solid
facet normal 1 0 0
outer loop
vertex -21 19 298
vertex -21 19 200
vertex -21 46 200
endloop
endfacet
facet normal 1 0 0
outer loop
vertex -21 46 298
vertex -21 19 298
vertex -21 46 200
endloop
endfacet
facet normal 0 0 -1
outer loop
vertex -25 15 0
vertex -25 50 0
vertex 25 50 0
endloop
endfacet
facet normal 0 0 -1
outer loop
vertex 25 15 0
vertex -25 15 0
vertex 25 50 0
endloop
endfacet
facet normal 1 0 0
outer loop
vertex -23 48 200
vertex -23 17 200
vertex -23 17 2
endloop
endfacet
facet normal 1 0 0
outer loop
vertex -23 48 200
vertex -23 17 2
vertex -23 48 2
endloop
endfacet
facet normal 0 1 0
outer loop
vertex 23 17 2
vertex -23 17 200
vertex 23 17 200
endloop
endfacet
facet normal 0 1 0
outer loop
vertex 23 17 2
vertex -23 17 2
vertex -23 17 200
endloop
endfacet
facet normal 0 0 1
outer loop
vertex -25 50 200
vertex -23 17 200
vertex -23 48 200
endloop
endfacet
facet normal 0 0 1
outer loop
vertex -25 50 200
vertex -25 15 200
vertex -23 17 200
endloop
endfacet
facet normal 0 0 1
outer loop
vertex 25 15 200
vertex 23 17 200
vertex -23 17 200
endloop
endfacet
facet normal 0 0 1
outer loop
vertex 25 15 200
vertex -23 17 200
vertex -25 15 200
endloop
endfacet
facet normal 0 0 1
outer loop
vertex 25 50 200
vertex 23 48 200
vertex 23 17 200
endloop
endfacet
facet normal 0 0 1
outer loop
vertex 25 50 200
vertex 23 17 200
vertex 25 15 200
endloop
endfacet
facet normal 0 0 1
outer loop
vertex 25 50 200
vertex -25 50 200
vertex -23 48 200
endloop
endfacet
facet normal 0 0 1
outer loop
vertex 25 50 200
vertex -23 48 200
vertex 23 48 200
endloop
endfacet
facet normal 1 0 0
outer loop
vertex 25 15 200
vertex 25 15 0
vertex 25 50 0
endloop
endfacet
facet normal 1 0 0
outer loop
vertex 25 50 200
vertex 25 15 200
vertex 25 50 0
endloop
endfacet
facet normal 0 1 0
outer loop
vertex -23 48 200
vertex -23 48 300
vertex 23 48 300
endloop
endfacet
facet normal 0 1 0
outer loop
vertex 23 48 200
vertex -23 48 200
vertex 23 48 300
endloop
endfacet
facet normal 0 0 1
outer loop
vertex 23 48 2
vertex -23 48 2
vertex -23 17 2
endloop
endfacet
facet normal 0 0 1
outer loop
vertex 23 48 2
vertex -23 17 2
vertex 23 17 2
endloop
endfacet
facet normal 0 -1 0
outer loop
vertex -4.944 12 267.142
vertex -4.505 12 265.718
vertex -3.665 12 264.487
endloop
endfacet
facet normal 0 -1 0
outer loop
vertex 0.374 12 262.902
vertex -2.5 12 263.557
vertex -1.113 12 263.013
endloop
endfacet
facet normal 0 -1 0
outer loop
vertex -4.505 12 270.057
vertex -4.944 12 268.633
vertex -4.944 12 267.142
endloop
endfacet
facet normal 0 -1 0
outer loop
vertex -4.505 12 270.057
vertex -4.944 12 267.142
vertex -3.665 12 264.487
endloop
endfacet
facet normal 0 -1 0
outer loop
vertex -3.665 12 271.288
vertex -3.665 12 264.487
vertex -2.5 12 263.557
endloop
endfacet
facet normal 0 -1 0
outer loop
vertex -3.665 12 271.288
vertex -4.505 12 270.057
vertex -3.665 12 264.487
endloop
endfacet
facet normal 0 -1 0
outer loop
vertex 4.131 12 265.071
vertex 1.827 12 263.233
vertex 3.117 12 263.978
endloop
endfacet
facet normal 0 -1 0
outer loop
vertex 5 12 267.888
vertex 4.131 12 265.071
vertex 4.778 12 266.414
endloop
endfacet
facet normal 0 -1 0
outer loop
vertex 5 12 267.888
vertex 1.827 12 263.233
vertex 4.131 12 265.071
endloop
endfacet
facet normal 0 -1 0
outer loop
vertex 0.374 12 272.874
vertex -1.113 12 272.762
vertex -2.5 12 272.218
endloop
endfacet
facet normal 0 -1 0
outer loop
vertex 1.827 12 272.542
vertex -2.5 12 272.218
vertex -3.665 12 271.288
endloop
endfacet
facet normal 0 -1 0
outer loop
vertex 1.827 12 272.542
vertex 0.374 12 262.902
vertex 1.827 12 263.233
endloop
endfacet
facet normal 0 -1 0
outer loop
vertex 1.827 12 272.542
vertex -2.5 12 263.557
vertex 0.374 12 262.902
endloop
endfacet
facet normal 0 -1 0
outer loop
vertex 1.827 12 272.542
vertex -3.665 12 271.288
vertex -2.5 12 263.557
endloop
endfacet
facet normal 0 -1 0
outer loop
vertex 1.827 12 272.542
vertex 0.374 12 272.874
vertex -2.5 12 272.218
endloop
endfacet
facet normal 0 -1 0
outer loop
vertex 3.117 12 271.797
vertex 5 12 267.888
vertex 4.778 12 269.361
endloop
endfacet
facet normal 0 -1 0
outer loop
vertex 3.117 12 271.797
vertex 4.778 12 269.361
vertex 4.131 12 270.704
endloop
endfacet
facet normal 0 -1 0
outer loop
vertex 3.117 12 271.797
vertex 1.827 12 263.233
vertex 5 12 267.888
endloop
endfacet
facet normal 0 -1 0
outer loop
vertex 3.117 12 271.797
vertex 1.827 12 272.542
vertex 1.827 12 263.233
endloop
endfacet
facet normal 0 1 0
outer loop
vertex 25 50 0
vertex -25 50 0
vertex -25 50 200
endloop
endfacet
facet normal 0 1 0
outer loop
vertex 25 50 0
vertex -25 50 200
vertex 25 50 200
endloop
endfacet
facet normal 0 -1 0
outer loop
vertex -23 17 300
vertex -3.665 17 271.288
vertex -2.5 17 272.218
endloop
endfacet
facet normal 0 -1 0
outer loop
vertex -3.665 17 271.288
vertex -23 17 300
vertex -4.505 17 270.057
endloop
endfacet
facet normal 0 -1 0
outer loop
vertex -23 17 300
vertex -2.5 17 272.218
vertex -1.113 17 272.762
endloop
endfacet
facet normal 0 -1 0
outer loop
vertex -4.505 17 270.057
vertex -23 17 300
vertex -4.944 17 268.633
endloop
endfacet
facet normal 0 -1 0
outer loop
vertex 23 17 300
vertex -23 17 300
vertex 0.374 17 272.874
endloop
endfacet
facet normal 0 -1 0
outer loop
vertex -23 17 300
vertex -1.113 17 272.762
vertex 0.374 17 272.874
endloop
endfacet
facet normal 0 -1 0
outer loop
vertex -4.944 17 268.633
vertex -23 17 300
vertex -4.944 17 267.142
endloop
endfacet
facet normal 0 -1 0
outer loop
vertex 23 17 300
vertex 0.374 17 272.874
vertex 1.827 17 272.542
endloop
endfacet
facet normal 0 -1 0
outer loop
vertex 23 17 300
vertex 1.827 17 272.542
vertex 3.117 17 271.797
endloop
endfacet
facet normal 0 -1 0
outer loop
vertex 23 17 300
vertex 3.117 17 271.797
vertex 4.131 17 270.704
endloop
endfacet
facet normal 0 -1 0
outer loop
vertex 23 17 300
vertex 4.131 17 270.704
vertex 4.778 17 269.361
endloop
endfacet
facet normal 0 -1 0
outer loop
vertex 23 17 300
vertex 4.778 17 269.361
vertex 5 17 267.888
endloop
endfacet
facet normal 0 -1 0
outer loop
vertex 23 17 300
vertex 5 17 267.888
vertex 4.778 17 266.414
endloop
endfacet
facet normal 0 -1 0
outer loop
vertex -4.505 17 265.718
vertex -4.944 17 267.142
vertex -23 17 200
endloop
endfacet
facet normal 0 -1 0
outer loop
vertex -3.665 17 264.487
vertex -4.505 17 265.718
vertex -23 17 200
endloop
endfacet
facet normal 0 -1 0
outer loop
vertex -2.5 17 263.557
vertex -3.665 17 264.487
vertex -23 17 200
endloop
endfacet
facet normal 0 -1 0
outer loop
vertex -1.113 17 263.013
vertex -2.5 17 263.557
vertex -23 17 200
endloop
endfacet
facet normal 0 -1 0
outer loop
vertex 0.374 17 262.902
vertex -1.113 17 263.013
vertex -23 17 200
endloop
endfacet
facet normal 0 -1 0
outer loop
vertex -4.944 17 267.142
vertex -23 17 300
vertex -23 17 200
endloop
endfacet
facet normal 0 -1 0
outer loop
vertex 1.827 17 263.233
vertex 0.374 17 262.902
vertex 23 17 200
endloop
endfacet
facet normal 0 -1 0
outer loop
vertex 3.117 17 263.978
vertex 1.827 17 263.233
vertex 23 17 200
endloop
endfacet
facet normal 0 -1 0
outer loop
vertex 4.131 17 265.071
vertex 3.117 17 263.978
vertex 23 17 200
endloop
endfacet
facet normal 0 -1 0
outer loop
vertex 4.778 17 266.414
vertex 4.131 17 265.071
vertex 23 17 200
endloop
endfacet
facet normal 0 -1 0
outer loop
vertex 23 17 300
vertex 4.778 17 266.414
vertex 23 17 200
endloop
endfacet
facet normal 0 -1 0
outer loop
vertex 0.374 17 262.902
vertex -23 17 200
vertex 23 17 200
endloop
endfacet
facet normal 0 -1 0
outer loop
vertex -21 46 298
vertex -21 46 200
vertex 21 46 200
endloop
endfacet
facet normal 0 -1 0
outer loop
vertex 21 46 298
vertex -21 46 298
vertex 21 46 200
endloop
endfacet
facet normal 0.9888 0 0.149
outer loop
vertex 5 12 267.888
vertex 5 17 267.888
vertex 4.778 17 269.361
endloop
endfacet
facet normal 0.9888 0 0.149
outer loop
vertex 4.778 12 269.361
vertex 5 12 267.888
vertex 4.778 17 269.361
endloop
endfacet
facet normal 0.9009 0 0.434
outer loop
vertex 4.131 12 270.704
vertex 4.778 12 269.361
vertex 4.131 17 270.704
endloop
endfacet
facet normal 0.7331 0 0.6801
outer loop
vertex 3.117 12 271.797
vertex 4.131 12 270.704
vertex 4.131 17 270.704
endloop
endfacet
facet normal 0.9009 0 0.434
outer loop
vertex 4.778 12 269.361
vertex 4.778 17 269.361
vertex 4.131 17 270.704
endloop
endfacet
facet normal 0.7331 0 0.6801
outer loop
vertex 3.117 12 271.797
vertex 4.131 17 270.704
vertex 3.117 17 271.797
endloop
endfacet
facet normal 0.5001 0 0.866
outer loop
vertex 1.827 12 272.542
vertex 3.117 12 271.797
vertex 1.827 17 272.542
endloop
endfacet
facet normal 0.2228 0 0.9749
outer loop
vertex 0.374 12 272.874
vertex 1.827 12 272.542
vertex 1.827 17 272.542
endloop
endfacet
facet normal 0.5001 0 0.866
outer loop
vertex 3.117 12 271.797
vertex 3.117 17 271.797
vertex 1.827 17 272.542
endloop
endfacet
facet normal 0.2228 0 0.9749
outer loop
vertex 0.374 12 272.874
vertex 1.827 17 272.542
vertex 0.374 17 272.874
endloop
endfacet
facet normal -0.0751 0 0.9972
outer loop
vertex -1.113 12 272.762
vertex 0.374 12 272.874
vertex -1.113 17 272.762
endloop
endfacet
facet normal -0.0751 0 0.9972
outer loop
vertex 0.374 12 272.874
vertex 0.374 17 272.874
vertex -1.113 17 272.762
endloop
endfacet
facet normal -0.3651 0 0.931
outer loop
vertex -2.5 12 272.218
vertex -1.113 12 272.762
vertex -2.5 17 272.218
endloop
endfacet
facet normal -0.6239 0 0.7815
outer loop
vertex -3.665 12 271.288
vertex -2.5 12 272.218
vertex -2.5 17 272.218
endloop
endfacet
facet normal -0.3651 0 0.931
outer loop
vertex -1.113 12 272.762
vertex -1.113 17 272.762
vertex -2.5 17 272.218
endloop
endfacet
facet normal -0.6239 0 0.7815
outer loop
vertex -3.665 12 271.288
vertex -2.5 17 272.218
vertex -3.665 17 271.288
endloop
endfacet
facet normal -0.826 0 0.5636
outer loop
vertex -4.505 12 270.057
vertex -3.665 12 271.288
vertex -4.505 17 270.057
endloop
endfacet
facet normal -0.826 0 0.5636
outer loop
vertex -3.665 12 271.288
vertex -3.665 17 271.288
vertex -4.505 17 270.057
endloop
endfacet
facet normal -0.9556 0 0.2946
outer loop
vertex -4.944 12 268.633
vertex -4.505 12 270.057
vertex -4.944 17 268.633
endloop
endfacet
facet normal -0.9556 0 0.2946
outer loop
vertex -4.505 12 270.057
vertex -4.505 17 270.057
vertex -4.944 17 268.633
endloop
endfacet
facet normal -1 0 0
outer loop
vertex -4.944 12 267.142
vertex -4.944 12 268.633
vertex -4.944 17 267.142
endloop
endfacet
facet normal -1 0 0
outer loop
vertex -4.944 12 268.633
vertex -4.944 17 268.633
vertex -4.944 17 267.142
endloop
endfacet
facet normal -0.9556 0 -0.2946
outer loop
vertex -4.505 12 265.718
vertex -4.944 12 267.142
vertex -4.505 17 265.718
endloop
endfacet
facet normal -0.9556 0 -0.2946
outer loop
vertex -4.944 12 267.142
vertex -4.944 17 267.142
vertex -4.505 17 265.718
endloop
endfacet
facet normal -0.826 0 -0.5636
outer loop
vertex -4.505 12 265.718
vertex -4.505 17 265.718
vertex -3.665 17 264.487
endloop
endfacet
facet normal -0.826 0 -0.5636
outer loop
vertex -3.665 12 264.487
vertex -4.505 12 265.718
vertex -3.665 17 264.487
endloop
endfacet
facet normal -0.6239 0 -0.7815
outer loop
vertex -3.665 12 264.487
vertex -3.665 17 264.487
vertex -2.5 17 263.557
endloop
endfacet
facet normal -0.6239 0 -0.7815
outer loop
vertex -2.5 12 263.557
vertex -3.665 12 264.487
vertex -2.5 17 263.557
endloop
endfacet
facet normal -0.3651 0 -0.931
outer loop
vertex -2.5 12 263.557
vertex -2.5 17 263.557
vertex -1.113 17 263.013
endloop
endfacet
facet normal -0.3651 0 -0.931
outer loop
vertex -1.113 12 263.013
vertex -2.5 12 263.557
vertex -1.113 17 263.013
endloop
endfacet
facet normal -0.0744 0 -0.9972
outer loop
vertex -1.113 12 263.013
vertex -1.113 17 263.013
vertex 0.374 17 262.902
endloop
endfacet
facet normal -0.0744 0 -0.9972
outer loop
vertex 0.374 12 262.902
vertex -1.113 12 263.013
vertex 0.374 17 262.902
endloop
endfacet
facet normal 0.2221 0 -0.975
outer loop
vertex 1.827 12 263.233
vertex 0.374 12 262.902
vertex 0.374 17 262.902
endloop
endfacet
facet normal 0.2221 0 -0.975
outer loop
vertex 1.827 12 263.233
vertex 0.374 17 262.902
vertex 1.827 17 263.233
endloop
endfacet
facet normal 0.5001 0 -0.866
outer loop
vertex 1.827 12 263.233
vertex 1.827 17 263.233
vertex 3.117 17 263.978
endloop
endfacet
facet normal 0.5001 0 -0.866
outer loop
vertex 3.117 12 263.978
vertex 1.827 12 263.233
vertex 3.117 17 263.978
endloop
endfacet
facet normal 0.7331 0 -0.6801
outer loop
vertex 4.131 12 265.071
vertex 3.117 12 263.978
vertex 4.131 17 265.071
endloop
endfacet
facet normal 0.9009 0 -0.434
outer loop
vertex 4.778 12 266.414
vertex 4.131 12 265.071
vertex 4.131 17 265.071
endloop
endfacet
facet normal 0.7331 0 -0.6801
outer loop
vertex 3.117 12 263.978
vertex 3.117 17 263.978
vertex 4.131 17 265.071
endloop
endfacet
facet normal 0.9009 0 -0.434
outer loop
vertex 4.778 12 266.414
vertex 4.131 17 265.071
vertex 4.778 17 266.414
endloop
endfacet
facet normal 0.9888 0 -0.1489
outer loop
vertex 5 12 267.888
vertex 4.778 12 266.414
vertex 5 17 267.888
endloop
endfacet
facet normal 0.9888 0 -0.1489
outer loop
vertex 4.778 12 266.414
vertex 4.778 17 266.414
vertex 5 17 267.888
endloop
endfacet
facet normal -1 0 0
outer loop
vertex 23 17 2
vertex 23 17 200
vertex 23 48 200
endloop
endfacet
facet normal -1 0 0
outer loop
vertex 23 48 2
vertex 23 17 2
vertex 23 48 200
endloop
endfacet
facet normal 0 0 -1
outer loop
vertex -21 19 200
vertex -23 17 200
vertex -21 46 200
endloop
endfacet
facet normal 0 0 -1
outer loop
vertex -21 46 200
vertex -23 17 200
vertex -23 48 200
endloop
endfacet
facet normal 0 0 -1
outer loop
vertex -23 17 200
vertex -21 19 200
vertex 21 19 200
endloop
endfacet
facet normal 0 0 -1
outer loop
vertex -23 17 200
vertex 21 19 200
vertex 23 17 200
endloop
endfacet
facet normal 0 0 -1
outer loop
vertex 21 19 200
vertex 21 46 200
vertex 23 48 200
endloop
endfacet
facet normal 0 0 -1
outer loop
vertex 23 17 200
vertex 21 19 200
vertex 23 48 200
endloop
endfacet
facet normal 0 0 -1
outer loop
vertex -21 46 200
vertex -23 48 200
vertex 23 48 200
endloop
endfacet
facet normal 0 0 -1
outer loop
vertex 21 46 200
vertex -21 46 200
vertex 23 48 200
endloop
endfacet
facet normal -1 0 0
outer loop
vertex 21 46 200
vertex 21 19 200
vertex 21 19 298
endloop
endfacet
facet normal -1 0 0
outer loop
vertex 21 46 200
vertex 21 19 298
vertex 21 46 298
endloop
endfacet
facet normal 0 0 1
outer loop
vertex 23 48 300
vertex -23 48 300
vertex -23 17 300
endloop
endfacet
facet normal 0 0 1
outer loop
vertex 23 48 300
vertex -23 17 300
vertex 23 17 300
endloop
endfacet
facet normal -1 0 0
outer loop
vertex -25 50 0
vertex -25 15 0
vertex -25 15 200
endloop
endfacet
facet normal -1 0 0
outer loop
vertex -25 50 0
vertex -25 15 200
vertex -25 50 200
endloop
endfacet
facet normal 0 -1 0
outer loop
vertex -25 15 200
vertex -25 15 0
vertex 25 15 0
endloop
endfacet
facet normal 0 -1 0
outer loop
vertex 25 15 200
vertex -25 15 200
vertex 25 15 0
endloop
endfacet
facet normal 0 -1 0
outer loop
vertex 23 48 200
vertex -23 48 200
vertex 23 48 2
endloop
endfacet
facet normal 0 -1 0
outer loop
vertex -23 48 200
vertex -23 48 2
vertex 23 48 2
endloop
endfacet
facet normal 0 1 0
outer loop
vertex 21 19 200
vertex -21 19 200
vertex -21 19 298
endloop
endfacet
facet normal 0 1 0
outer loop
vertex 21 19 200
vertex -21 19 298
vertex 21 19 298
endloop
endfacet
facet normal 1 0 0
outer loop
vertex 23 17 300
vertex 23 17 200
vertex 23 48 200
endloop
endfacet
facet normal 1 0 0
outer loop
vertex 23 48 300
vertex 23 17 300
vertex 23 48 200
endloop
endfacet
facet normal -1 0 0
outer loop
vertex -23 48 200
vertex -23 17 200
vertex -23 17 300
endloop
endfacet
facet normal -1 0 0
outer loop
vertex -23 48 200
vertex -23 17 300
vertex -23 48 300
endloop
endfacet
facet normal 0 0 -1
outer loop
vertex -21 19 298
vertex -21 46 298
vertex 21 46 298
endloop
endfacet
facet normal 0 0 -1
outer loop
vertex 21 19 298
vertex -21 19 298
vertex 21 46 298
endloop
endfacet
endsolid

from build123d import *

# Parameters (mm, degrees)
F0_W     = 50
F0_H     = 35
F1_DEPTH = 200
F2_T     = -2
F3_W     = 46
F3_H     = 31
F4_DEPTH = 100
F5_T     = -2
F6_R     = 5
F7_DEPTH = 5


with BuildPart() as f1:
    # F0 (on Top) → F1 (new body)
    with BuildSketch(Plane.XY):
        with Locations((0, 32.5)):
            Rectangle(F0_W, F0_H)
    extrude(amount=F1_DEPTH)

    # F2
    f2_openings = [f1.faces().sort_by_distance(p)[0] for p in [
        (0, 32.5, 200),
    ]]
    offset(amount=F2_T, openings=f2_openings)


with BuildPart() as f4:
    # F3 (on face) → F4 (new body)
    with BuildSketch(Plane.XY.offset(200)):
        with Locations((0, 32.5)):
            Rectangle(F3_W, F3_H)
    extrude(amount=F4_DEPTH)

    # F5
    f5_openings = [f4.faces().sort_by_distance(p)[0] for p in [
        (0, 32.5, 200),
    ]]
    offset(amount=F5_T, openings=f5_openings)

    # F6 (on face) → F7 (join)
    with BuildSketch(Plane.XZ.offset(-17)):
        with Locations((0, 267.8875625134)):
            Circle(F6_R)
    extrude(amount=F7_DEPTH)


solid = Compound([f1.part, f4.part])
